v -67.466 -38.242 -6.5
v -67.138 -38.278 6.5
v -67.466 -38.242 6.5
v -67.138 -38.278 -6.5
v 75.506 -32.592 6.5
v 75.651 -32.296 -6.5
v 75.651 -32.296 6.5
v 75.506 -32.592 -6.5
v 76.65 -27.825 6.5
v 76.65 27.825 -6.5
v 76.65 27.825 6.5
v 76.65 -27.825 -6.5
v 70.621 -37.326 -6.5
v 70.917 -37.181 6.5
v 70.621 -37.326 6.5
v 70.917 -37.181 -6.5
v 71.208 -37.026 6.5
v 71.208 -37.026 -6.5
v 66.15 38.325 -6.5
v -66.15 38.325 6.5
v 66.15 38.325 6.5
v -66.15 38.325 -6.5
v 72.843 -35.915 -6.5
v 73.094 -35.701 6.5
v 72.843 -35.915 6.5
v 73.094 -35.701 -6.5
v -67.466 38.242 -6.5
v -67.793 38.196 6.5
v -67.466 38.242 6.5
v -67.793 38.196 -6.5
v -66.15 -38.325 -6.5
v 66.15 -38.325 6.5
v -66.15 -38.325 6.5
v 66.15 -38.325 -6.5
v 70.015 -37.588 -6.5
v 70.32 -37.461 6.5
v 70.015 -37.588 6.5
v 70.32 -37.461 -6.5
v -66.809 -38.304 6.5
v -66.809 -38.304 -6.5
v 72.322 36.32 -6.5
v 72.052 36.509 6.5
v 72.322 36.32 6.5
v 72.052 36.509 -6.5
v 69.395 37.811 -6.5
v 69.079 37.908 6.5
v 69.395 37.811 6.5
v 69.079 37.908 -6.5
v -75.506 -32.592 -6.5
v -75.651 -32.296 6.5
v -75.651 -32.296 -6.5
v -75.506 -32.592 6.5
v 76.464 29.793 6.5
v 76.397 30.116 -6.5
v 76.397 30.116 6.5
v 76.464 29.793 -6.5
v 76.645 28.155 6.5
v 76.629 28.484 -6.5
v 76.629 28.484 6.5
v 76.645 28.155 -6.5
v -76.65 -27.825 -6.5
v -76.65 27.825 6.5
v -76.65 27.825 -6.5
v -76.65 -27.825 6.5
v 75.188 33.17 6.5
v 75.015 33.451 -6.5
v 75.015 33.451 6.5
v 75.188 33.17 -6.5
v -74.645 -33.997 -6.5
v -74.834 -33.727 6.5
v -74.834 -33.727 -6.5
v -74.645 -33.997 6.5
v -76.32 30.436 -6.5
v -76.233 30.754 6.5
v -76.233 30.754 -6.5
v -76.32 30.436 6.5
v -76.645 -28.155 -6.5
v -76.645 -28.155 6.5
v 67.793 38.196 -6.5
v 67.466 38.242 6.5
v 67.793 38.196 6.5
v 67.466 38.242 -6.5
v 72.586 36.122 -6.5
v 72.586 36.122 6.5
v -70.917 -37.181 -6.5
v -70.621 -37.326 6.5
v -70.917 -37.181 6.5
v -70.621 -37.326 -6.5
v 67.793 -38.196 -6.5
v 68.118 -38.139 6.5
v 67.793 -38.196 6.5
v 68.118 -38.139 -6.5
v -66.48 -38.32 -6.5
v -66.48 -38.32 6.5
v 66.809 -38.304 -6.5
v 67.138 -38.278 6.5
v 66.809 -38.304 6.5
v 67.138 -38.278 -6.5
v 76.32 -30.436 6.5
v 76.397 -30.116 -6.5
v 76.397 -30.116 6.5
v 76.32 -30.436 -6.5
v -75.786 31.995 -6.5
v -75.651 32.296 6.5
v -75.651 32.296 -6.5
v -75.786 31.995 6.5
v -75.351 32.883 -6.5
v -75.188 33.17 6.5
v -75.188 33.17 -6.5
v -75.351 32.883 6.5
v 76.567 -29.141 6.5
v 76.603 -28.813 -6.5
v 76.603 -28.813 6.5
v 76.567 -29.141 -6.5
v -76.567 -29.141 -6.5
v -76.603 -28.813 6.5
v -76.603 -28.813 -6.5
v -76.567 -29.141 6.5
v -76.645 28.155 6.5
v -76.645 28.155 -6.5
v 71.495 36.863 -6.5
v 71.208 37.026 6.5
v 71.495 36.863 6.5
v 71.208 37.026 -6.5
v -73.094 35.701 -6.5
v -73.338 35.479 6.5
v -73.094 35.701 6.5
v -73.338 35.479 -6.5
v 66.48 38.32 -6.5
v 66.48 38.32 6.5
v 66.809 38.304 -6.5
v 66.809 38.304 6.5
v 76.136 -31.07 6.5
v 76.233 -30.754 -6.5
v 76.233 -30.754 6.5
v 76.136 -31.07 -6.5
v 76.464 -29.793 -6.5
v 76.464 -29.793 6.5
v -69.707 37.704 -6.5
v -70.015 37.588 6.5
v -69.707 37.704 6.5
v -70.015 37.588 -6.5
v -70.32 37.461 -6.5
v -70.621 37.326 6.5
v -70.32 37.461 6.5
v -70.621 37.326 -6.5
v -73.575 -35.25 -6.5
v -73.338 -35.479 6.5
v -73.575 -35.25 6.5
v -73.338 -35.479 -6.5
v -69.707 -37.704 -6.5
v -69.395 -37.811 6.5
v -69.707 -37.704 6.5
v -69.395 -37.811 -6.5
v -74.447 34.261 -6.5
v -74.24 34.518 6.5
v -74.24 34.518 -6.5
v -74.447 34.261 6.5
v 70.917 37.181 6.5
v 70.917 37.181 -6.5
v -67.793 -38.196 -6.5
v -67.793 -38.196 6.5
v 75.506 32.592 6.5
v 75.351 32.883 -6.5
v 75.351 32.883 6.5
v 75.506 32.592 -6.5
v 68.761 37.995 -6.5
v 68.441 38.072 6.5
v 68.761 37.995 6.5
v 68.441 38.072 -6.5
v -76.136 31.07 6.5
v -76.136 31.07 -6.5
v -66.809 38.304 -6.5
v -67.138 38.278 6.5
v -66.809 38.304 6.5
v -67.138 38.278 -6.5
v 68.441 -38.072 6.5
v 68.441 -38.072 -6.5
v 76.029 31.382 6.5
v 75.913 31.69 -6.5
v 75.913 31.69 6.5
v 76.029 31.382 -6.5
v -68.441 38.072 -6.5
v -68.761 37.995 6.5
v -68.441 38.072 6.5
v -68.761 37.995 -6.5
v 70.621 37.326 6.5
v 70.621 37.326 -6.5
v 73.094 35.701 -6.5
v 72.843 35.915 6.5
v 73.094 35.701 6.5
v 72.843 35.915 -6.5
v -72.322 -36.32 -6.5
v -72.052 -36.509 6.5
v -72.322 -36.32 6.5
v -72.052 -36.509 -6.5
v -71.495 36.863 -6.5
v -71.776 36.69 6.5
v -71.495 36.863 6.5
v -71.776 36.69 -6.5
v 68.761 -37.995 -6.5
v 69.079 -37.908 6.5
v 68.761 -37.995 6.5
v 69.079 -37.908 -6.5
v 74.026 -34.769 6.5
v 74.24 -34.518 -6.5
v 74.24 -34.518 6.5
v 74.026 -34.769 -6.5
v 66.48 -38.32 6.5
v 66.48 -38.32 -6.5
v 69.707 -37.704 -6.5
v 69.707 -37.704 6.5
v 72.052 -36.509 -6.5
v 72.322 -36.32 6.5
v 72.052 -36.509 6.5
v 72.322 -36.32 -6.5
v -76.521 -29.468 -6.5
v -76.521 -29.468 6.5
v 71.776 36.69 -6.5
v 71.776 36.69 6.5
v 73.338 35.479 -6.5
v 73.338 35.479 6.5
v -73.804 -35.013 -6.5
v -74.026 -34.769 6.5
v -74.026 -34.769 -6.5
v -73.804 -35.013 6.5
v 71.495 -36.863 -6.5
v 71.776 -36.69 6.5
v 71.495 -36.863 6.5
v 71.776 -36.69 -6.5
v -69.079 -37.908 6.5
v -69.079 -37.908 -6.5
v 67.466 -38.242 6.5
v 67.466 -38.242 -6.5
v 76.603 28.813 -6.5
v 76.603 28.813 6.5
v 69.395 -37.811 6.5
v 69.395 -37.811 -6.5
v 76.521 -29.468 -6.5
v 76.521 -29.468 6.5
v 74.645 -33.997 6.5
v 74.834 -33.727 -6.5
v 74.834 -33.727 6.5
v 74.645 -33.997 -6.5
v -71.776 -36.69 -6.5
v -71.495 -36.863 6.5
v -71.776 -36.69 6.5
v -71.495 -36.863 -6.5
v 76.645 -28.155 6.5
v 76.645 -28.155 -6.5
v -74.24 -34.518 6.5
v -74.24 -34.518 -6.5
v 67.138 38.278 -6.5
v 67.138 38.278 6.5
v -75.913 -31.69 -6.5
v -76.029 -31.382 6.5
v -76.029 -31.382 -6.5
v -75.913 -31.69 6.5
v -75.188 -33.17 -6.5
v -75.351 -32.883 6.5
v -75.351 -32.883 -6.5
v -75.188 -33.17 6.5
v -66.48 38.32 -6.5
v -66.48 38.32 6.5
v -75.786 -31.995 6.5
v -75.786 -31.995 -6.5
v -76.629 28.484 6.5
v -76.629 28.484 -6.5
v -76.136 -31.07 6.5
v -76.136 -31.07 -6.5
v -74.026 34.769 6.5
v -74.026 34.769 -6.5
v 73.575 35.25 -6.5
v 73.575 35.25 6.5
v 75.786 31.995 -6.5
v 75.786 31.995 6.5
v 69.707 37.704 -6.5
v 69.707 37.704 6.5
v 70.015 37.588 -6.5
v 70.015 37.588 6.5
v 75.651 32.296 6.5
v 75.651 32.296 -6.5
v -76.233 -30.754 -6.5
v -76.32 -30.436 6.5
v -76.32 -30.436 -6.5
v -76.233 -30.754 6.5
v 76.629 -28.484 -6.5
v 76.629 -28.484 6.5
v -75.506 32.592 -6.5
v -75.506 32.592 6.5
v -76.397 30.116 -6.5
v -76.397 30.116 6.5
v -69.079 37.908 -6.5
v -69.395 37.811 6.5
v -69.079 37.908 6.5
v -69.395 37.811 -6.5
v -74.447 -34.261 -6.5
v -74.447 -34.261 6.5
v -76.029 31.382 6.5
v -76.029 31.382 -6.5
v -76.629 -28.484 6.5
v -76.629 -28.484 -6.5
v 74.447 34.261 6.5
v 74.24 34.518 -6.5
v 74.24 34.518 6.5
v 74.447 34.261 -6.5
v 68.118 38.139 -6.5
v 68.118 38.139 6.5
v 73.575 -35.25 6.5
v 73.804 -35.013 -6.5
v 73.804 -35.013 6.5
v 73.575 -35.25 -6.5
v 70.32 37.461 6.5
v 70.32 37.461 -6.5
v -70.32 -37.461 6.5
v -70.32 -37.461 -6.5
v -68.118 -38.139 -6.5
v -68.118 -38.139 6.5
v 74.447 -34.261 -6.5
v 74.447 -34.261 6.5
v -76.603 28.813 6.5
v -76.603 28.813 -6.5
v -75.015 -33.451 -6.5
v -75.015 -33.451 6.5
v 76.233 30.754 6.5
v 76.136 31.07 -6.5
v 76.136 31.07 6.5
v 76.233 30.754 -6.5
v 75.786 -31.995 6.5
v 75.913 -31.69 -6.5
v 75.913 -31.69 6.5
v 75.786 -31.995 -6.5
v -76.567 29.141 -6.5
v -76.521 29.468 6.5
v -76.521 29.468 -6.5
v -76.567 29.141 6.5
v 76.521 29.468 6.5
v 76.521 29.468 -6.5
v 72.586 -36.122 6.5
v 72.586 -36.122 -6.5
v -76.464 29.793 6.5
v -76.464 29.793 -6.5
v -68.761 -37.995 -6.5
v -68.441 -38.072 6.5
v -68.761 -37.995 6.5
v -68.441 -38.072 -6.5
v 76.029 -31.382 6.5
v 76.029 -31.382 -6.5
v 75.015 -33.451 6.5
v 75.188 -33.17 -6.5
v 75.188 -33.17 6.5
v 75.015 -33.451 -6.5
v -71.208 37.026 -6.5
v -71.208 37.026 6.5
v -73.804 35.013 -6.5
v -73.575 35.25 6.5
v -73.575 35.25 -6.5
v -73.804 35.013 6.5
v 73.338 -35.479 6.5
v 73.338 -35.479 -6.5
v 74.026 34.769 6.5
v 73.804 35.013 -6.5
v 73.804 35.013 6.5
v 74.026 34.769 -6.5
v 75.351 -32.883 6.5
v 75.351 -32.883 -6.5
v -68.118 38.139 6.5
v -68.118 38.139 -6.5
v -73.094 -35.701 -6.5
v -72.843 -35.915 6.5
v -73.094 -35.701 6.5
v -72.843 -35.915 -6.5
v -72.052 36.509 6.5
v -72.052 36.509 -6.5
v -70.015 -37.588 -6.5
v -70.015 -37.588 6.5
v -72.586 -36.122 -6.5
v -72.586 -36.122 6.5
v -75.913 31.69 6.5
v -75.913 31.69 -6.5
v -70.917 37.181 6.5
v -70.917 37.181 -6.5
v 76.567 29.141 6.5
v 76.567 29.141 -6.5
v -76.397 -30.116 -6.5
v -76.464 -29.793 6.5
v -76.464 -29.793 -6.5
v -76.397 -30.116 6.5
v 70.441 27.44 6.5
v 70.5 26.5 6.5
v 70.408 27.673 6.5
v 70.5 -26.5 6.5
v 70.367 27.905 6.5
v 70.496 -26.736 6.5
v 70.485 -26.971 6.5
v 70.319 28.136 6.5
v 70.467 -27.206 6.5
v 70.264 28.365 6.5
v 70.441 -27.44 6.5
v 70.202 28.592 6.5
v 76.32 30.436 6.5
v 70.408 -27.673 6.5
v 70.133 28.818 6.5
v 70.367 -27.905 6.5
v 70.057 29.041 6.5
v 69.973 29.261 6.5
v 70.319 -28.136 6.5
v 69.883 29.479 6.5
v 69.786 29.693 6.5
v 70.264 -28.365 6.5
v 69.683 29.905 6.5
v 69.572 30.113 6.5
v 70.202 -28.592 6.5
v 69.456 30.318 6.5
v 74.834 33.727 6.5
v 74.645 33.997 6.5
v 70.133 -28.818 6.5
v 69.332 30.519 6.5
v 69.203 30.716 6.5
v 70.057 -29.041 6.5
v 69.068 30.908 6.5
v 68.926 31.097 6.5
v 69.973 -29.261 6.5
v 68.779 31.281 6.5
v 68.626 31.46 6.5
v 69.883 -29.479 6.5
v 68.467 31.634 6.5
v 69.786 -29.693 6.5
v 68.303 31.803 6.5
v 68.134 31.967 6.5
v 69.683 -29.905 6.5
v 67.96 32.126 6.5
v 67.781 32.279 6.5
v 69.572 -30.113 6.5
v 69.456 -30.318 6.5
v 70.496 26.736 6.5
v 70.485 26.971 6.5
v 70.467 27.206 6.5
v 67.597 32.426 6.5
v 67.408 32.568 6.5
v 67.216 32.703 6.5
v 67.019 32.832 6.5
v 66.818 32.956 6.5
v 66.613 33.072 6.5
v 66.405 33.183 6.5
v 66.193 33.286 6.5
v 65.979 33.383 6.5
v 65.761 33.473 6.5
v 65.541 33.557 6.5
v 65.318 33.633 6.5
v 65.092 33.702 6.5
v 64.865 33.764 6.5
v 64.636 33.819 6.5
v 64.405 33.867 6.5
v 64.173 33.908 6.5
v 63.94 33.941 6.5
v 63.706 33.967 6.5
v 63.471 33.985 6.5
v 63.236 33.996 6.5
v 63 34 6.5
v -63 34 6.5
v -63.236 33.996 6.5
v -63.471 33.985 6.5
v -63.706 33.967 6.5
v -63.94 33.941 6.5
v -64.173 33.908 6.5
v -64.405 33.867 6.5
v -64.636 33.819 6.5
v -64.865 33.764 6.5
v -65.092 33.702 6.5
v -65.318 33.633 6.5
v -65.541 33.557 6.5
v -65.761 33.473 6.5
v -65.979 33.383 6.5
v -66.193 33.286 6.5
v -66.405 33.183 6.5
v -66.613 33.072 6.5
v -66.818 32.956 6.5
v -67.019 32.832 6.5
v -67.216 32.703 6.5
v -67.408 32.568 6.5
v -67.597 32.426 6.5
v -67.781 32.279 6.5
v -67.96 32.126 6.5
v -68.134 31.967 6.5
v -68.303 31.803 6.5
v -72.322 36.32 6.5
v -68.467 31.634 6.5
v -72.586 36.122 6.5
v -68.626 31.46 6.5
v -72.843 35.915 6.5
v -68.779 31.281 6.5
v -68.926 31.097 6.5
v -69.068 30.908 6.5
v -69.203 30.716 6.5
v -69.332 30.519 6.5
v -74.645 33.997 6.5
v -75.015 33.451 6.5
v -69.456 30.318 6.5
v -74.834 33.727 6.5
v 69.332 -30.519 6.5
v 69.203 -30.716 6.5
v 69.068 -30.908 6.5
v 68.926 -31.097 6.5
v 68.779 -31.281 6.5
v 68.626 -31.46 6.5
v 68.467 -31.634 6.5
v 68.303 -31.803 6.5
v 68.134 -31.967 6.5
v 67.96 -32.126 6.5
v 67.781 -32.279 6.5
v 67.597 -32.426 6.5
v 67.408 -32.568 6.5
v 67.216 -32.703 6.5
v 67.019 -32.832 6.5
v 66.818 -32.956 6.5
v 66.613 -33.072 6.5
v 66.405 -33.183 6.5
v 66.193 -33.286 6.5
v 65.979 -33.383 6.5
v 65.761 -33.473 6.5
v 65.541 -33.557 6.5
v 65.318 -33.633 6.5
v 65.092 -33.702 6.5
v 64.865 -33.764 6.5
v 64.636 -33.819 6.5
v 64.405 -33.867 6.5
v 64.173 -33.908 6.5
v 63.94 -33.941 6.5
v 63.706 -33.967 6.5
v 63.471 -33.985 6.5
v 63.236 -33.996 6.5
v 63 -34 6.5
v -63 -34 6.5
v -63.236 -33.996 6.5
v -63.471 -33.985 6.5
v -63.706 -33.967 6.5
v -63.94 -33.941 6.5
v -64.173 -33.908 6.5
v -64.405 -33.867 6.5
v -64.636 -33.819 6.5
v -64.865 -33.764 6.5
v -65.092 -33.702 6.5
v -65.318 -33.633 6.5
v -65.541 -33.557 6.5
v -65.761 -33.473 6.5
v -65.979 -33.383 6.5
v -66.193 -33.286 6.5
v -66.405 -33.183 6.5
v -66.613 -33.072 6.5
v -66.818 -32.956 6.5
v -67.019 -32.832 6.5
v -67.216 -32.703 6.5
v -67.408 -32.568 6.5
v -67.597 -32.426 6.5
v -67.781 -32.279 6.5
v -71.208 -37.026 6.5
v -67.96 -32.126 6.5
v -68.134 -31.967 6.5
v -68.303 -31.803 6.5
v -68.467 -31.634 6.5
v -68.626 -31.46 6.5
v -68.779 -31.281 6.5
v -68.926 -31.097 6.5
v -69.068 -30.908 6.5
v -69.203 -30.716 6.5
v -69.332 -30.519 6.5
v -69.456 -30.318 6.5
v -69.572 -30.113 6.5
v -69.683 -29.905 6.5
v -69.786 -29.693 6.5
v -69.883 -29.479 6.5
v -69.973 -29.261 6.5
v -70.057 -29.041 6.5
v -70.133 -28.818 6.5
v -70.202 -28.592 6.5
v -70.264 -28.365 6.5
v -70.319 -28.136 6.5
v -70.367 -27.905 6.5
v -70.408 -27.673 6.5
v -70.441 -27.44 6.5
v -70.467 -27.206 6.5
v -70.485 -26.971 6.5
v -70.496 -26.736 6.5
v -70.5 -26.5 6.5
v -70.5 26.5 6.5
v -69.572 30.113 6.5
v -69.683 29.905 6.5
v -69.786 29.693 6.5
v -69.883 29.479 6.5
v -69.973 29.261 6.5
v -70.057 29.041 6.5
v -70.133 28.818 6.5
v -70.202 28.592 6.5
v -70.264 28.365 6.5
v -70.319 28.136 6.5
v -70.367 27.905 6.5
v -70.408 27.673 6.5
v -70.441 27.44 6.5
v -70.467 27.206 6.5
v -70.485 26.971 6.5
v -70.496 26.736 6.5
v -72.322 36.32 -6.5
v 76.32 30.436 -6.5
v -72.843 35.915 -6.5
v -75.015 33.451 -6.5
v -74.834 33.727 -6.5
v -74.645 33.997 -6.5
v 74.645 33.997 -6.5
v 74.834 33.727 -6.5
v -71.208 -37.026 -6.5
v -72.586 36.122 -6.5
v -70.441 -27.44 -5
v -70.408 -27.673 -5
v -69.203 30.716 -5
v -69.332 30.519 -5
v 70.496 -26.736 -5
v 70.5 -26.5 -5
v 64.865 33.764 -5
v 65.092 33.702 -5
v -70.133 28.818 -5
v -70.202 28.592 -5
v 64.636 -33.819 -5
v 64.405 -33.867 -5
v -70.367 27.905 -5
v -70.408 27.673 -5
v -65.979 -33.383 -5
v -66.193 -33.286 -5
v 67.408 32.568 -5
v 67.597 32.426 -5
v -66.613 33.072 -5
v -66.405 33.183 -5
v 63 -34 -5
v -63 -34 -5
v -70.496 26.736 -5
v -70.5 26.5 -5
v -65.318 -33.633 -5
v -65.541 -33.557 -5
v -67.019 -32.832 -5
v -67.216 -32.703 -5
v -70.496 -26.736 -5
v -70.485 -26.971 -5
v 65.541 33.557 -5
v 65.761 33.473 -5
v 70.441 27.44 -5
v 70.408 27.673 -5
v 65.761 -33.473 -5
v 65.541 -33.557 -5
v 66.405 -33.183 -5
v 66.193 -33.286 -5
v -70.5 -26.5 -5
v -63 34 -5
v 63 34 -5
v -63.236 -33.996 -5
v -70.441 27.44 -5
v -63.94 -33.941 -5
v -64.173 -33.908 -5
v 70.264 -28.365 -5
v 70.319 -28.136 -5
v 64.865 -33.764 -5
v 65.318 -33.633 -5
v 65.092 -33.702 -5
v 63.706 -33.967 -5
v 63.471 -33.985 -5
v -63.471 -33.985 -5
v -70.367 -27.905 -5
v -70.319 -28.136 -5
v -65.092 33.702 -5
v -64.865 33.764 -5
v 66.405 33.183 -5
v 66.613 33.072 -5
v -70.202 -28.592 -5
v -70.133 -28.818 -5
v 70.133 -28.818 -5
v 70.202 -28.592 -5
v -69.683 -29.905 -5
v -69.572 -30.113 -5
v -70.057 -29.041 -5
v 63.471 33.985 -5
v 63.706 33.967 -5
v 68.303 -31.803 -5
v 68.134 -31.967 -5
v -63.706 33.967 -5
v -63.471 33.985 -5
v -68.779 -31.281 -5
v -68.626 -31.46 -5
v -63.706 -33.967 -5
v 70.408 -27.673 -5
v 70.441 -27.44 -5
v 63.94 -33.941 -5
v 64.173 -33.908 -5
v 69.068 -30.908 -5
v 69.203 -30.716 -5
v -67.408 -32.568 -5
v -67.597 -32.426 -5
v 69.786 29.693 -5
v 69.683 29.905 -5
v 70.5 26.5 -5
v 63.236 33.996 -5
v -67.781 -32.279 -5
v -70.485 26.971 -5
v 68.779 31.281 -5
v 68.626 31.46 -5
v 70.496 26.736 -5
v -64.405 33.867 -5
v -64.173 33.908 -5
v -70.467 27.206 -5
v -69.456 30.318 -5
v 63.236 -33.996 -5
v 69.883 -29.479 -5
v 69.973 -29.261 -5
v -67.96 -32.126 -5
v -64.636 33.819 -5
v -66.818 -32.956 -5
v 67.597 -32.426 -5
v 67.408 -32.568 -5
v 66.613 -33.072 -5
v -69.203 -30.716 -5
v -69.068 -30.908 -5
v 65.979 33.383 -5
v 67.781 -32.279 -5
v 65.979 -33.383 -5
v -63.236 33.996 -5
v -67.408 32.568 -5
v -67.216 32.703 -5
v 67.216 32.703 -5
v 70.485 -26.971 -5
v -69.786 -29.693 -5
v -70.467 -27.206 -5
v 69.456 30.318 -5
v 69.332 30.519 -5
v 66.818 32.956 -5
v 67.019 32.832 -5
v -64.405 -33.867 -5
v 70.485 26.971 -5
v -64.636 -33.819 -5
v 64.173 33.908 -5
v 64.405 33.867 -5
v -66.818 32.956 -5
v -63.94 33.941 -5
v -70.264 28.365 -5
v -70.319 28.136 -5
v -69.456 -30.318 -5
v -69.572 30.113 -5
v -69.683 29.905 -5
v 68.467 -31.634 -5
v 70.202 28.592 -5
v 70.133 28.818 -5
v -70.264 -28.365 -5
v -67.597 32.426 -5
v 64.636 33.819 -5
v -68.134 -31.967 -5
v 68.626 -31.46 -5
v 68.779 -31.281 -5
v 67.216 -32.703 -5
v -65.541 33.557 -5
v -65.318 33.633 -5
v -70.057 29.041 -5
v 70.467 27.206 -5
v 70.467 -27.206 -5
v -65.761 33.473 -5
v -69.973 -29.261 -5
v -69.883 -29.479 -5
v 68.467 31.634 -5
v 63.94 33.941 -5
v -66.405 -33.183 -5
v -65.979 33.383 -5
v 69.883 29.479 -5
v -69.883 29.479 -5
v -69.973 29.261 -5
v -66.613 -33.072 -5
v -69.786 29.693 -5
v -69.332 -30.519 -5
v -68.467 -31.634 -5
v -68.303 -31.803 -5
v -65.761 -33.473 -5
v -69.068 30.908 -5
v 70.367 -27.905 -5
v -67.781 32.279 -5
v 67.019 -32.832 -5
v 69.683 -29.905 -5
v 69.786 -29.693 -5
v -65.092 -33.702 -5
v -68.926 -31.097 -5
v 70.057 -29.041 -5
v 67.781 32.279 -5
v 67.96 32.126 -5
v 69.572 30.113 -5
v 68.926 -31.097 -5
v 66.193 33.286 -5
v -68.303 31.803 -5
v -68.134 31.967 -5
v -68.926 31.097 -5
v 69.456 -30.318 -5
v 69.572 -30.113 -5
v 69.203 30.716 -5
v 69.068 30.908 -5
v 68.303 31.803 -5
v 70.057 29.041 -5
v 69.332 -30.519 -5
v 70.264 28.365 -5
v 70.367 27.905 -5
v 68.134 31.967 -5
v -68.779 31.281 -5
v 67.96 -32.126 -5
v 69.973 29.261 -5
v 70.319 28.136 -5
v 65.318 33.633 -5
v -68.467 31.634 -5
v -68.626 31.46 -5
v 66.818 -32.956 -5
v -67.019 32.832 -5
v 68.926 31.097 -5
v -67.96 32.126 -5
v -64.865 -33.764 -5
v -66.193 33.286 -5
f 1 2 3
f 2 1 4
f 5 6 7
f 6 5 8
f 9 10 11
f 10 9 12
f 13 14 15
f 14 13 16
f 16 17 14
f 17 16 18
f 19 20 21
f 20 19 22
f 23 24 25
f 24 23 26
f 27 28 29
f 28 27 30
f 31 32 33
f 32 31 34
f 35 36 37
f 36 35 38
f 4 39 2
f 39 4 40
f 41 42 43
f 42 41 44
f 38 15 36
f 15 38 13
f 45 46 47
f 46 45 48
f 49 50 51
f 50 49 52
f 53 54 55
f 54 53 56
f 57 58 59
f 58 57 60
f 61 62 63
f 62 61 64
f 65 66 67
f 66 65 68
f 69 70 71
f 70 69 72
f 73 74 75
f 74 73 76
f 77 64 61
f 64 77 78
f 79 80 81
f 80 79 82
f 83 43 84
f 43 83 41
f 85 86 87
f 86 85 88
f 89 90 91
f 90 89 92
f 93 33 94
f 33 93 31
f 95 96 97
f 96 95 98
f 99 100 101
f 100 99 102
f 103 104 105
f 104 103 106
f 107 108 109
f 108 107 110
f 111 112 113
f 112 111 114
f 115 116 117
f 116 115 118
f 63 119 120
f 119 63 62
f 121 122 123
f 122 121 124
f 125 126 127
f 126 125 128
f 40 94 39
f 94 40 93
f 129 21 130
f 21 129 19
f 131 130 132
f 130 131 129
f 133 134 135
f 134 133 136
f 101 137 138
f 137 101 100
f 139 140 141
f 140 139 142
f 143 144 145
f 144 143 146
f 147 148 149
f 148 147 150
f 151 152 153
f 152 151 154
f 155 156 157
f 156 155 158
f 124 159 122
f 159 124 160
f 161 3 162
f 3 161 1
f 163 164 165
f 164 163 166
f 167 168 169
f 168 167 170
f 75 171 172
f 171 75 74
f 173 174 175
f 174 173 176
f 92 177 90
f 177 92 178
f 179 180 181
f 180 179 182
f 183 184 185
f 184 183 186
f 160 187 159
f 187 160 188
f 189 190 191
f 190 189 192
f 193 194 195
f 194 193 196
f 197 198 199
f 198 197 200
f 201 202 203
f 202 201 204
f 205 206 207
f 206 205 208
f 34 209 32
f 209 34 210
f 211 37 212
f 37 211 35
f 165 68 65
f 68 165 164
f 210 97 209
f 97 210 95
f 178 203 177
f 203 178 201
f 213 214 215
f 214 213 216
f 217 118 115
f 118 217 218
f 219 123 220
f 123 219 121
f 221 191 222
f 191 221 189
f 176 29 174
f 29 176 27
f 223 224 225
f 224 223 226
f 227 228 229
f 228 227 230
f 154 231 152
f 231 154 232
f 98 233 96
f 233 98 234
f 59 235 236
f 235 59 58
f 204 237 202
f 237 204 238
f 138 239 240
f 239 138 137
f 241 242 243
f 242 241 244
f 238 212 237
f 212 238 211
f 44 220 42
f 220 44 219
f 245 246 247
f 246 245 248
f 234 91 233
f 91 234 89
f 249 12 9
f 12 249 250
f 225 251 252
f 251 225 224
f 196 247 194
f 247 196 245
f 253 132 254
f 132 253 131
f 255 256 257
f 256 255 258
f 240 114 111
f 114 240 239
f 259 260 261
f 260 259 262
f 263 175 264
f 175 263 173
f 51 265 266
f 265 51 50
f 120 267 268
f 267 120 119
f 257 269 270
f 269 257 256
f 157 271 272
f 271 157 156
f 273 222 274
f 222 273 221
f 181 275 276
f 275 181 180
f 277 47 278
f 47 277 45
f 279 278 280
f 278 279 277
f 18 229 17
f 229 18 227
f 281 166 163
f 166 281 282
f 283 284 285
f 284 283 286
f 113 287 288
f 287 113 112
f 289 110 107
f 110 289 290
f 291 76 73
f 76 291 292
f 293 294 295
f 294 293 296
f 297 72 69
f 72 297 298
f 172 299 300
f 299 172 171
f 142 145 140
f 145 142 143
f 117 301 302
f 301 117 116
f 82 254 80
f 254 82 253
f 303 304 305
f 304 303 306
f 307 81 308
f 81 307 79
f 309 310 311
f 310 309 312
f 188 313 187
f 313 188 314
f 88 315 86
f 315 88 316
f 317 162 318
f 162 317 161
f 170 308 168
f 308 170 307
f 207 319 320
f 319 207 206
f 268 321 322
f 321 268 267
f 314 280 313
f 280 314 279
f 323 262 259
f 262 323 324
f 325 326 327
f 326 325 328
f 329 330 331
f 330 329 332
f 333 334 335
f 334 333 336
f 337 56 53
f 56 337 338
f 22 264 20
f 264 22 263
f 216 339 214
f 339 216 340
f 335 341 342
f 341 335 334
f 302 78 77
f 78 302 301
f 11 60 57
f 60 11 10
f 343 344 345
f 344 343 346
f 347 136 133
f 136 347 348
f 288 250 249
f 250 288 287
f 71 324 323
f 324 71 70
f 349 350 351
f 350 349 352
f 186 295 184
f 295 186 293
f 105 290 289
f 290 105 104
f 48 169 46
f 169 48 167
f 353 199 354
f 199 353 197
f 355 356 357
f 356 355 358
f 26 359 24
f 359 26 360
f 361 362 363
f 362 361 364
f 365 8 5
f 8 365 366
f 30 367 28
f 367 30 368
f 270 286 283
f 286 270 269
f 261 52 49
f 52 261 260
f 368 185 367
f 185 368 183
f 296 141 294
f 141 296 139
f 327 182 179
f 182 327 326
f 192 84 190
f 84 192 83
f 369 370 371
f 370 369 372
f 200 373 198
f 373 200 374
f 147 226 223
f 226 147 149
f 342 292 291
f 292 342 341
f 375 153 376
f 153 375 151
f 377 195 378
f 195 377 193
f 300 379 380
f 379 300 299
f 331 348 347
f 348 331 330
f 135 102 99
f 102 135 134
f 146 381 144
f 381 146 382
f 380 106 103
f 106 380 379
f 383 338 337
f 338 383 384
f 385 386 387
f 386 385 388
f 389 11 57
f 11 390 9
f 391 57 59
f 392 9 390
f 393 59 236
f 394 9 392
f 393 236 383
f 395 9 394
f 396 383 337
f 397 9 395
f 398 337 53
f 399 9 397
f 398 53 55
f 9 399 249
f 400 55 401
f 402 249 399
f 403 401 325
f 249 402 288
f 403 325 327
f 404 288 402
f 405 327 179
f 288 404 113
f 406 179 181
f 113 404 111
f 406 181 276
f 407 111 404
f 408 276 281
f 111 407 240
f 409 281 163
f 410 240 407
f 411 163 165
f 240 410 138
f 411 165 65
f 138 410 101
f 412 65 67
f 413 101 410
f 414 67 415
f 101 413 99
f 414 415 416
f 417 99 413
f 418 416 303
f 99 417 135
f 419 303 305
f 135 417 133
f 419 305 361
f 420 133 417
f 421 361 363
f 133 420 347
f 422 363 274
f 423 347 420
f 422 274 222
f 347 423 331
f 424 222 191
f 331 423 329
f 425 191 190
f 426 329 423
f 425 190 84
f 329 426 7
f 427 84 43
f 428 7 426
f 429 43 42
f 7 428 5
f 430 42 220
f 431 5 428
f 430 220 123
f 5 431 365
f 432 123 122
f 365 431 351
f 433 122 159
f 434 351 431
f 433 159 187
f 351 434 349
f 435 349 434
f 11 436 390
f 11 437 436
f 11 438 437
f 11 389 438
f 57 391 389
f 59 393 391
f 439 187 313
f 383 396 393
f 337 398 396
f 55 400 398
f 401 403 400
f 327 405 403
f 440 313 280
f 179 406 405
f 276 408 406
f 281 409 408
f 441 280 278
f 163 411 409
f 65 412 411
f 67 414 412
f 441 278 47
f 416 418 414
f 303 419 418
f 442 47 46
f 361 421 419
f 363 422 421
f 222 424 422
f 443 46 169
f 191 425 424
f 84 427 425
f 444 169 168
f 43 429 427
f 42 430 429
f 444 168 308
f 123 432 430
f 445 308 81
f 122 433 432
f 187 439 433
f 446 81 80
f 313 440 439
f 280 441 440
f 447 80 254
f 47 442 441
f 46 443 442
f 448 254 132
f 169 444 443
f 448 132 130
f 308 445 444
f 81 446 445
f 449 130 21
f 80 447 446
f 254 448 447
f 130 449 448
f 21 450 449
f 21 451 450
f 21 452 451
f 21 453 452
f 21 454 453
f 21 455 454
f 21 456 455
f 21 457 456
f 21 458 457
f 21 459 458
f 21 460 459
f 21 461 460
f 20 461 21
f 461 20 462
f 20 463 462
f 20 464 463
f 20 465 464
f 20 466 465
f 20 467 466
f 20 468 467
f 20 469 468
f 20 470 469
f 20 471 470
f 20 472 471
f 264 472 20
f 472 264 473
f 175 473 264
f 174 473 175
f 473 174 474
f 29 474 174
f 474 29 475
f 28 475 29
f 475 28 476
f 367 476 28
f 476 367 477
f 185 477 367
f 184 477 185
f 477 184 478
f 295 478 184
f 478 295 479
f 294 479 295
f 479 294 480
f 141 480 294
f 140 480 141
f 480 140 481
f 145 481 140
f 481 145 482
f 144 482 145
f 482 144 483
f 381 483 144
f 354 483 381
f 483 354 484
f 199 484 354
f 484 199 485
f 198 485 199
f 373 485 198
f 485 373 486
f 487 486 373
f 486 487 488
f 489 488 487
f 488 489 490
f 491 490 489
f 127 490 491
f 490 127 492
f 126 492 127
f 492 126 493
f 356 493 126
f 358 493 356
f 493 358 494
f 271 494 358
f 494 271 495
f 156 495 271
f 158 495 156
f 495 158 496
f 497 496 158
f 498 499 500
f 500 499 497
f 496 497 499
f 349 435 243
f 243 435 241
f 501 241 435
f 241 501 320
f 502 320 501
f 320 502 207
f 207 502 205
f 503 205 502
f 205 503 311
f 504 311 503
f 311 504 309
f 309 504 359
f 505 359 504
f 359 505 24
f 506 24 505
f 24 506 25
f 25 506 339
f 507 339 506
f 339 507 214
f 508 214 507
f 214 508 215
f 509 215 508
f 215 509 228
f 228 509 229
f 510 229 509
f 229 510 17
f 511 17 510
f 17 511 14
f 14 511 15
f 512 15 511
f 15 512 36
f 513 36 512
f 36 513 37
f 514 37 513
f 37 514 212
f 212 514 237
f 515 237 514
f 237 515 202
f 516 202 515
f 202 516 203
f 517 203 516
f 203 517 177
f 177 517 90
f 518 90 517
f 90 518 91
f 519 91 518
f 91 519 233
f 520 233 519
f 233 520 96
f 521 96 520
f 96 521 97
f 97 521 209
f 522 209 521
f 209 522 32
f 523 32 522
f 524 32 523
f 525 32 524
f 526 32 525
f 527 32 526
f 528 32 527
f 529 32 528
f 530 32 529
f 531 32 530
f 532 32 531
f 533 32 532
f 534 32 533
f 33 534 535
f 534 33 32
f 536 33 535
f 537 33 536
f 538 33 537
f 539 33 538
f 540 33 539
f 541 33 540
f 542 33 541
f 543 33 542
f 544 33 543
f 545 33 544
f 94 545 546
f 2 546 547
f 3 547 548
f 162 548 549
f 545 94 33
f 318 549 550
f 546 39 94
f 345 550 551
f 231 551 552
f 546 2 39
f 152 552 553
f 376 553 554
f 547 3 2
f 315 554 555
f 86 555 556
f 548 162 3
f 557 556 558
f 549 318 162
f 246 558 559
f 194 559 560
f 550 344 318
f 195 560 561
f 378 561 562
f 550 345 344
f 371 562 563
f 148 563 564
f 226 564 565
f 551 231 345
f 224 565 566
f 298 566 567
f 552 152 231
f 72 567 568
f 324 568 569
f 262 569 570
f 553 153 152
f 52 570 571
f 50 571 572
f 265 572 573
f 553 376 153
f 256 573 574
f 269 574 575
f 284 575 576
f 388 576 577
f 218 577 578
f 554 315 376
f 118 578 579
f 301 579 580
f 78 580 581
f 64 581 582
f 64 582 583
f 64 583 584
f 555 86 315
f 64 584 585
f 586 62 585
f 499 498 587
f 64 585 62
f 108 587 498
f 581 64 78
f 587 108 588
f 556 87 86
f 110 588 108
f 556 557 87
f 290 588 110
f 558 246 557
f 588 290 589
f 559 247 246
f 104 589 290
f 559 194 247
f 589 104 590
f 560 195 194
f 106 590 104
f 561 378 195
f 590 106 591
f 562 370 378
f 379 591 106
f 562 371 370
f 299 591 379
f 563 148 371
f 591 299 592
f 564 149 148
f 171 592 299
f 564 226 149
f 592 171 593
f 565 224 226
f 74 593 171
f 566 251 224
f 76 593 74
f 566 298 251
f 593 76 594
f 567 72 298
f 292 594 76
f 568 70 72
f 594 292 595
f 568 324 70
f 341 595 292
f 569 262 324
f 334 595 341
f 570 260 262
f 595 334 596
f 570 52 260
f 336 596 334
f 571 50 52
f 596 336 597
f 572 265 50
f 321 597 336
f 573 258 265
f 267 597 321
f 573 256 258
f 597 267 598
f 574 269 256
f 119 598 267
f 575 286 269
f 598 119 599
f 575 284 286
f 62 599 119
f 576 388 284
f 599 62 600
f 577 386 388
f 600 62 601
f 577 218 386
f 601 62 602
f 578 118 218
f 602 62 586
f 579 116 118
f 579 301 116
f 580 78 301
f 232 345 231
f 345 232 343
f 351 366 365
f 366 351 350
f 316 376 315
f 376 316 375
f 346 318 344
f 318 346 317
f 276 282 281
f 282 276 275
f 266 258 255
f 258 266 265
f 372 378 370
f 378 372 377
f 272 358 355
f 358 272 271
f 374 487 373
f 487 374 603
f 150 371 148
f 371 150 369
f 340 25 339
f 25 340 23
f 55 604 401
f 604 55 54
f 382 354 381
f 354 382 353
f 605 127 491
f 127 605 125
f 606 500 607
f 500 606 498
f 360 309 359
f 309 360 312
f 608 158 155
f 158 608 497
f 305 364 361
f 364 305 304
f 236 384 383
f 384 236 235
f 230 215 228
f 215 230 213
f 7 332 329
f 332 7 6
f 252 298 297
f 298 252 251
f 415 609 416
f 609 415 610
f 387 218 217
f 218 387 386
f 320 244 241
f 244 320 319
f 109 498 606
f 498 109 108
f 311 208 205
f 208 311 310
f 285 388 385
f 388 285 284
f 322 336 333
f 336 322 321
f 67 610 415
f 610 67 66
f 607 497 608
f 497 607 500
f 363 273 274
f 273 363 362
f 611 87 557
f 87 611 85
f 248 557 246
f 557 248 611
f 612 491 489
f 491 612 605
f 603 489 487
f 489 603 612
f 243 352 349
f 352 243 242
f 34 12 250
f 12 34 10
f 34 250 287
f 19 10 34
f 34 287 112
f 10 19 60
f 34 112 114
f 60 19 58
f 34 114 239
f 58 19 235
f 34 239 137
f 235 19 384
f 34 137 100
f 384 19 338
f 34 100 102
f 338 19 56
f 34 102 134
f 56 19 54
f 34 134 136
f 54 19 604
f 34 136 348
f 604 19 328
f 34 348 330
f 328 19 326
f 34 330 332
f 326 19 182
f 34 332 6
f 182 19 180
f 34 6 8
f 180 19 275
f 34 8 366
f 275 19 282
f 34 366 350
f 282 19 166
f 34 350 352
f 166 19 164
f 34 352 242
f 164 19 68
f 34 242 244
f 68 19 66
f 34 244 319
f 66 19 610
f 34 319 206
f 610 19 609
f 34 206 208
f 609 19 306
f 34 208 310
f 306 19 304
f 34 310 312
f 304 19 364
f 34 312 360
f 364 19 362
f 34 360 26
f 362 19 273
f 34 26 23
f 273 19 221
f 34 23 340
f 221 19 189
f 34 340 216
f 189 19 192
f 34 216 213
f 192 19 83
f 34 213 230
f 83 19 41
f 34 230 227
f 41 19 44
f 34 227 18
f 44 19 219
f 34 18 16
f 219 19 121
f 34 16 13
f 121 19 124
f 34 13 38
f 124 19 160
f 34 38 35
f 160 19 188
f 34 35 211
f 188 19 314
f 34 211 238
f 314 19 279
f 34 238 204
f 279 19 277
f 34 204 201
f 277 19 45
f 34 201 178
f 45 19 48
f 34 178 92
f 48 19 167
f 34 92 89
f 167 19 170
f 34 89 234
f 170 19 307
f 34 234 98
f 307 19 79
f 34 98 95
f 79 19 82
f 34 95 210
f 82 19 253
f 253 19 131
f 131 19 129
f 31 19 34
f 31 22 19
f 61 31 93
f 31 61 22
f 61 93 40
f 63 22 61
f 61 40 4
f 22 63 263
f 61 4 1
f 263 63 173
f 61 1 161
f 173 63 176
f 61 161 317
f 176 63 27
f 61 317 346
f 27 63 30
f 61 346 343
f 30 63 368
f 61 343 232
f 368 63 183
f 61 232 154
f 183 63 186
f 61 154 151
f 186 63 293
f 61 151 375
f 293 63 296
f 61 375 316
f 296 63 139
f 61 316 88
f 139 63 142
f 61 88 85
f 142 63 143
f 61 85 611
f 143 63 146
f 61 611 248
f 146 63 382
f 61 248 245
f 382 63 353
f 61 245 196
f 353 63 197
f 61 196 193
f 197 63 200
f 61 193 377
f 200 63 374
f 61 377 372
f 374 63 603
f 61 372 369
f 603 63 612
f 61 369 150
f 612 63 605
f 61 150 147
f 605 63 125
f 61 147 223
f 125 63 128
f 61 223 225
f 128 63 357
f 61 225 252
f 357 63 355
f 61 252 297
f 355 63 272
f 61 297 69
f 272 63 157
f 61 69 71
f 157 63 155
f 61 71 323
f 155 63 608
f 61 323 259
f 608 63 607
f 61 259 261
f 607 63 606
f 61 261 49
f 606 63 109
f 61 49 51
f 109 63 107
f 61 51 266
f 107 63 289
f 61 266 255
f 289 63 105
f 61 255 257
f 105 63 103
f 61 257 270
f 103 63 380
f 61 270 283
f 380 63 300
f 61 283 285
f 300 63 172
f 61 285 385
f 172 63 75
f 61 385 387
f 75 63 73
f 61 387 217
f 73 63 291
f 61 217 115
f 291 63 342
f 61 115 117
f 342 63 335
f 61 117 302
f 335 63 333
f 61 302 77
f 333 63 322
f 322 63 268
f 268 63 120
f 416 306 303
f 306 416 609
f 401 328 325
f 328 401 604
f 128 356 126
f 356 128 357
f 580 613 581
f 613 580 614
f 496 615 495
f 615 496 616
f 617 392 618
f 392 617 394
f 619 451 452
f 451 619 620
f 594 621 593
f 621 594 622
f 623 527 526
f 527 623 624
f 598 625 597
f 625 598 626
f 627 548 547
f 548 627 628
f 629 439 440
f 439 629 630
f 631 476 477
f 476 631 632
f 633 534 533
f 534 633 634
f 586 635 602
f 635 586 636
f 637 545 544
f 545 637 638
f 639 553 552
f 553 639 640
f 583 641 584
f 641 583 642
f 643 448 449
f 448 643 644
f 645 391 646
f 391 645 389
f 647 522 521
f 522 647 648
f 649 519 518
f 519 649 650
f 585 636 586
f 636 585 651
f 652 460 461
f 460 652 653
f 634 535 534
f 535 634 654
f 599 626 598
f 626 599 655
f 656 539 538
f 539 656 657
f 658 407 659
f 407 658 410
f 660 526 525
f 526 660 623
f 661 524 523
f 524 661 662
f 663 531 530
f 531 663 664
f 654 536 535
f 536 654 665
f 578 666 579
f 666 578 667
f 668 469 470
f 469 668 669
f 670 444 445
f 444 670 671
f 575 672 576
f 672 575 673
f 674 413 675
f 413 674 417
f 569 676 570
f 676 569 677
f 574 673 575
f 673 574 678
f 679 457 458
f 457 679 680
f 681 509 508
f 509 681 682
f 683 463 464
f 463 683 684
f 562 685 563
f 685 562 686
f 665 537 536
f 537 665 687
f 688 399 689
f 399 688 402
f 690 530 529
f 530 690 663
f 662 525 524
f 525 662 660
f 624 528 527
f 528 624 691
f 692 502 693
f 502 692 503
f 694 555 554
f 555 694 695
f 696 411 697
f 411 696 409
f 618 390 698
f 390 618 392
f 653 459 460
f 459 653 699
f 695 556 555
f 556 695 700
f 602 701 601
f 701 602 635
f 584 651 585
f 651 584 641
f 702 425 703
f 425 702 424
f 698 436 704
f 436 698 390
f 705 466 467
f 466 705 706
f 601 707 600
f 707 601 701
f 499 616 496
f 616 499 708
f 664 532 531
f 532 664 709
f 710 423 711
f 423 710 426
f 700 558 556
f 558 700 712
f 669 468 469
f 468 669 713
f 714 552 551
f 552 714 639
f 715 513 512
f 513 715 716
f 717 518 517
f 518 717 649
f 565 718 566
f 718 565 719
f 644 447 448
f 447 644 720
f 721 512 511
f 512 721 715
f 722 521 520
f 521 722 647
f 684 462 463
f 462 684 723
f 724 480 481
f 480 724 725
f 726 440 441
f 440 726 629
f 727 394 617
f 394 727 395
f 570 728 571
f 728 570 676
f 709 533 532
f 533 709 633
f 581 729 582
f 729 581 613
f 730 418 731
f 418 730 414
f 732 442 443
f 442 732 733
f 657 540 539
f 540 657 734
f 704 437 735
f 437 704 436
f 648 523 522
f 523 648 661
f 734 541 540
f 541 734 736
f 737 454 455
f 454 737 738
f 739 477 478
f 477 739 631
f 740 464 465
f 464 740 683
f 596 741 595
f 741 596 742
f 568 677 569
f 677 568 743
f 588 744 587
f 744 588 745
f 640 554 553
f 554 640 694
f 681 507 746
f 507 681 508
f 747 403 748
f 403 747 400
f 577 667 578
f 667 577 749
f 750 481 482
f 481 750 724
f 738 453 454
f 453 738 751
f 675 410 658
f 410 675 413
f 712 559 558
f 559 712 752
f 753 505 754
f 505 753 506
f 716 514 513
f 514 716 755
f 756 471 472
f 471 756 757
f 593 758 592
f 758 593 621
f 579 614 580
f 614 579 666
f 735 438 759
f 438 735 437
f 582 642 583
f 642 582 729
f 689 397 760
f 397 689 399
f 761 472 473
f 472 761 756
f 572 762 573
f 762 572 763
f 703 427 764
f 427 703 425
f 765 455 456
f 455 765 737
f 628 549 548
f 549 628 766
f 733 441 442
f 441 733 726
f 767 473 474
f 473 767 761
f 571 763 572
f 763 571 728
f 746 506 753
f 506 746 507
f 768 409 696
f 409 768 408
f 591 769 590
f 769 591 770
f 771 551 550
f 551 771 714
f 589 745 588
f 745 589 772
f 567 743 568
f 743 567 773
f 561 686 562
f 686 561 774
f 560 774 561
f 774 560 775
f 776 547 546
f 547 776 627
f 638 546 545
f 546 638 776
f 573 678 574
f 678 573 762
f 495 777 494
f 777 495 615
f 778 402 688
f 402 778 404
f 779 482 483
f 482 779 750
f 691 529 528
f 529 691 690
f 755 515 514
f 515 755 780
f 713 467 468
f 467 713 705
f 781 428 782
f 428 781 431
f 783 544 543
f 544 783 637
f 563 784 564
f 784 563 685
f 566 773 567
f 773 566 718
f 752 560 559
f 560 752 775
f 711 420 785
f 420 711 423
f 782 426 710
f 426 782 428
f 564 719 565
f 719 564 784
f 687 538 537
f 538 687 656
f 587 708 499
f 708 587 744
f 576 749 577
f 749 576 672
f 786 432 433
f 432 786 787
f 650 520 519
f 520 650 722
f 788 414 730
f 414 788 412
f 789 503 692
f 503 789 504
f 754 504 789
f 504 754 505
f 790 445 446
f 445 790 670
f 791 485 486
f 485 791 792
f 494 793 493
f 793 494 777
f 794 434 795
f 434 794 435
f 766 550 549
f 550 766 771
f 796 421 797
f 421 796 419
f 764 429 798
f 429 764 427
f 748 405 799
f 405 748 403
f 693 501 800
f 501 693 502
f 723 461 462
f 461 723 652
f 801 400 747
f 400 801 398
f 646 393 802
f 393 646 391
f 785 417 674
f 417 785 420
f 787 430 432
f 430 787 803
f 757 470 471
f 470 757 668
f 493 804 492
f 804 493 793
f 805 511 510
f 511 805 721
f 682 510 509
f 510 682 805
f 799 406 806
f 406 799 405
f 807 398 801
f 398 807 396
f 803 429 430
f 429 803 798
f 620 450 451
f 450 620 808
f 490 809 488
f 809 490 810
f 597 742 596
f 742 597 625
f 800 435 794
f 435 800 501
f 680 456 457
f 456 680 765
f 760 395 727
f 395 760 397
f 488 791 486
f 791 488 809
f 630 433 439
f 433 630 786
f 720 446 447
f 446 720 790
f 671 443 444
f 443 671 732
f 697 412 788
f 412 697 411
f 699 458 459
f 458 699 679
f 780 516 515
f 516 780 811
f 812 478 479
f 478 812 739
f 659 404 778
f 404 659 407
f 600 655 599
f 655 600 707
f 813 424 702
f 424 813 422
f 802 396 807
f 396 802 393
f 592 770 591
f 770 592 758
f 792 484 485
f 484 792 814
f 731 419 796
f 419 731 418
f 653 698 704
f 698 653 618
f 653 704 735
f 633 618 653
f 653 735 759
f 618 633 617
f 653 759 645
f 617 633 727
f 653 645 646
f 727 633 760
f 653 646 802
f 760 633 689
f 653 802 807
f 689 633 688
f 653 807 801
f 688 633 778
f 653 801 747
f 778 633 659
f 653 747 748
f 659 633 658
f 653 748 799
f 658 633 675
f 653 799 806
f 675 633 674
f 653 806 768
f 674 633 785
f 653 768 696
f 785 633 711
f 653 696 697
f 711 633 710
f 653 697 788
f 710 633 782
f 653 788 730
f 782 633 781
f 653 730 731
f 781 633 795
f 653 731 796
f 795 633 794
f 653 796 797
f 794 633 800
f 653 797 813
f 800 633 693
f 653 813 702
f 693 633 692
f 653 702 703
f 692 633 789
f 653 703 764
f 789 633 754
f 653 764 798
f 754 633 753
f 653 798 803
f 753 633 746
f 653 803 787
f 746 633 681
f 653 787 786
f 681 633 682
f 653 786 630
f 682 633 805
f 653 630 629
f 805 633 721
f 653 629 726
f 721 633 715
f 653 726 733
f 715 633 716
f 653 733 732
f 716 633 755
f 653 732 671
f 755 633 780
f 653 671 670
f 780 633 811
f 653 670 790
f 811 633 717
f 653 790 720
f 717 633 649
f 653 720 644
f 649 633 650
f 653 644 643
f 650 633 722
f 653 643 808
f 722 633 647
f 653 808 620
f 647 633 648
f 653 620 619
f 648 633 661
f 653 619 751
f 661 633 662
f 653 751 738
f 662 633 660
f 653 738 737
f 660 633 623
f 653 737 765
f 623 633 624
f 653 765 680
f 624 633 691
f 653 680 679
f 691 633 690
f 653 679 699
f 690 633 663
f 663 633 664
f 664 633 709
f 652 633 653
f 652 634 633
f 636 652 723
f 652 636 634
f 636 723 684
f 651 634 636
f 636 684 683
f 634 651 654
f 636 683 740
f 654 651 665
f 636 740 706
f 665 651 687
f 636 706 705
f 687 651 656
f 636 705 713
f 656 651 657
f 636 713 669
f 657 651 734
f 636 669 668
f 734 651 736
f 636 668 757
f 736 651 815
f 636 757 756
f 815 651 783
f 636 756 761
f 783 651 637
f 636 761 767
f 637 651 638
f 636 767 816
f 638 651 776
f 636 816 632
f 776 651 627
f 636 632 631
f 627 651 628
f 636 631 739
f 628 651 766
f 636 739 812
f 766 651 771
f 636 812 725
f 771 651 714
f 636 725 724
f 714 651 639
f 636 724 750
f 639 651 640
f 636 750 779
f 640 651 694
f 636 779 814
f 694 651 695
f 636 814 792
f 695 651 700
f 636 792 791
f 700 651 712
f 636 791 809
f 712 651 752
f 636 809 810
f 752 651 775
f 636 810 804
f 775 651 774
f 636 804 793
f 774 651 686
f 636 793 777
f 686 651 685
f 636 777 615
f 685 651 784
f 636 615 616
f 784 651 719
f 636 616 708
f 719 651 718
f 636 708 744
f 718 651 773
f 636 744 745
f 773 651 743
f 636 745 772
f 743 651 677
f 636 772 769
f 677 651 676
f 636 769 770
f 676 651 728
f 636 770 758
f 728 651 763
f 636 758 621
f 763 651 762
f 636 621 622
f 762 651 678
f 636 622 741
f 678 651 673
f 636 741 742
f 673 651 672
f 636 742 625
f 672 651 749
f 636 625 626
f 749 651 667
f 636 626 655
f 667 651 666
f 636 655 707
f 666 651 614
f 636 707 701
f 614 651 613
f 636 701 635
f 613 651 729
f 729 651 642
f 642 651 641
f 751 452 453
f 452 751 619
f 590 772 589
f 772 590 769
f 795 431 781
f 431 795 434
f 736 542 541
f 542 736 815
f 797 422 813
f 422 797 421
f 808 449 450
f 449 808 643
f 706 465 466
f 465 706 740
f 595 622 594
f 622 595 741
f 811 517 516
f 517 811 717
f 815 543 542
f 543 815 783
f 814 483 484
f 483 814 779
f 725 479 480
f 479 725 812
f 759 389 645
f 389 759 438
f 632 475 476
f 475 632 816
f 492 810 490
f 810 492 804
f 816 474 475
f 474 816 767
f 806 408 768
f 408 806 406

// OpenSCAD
$fn=200;
smartphone();

module smartphone(){
difference(){
    scale([1.05,1.05,1])
case();
scale([1,1,2])
    translate([0,0,1])
body();
}
}

module body(){
hull(){

cube([130, 60, 7], center=true);

mirror([1,0,0])
translate([142/2-8,69/2-8,0])
color("red")
cylinder(d=15,h=7,center=true);

mirror([0,1,0])
translate([142/2-8,69/2-8,0])
color("red")
cylinder(d=15,h=7,center=true);

mirror([0,0,1])
translate([142/2-8,69/2-8,0])
color("red")
cylinder(d=15,h=7,center=true);

mirror([1,0,0])
mirror([0,1,0])
translate([142/2-8,69/2-8,0])
color("red")
cylinder(d=15,h=7,center=true);
}
}


module case(){
hull(){

cube([135, 65, 13], center=true);

mirror([1,0,0])
translate([142/2-8,69/2-8,0])
color("red")
cylinder(d=20,h=13,center=true);

mirror([0,1,0])
translate([142/2-8,69/2-8,0])
color("red")
cylinder(d=20,h=13,center=true);

mirror([0,0,1])
translate([142/2-8,69/2-8,0])
color("red")
cylinder(d=20,h=13,center=true);

mirror([1,0,0])
mirror([0,1,0])
translate([142/2-8,69/2-8,0])
color("red")
cylinder(d=20,h=13,center=true);
}
}


module camera(){
cylinder(h=2,d=11.9,center=true);
translate([12.8,0,0])
cylinder(h=2,d=11.9,center=true);
translate([6,0,0])
cube([13,11.9,2],center=true);
}
